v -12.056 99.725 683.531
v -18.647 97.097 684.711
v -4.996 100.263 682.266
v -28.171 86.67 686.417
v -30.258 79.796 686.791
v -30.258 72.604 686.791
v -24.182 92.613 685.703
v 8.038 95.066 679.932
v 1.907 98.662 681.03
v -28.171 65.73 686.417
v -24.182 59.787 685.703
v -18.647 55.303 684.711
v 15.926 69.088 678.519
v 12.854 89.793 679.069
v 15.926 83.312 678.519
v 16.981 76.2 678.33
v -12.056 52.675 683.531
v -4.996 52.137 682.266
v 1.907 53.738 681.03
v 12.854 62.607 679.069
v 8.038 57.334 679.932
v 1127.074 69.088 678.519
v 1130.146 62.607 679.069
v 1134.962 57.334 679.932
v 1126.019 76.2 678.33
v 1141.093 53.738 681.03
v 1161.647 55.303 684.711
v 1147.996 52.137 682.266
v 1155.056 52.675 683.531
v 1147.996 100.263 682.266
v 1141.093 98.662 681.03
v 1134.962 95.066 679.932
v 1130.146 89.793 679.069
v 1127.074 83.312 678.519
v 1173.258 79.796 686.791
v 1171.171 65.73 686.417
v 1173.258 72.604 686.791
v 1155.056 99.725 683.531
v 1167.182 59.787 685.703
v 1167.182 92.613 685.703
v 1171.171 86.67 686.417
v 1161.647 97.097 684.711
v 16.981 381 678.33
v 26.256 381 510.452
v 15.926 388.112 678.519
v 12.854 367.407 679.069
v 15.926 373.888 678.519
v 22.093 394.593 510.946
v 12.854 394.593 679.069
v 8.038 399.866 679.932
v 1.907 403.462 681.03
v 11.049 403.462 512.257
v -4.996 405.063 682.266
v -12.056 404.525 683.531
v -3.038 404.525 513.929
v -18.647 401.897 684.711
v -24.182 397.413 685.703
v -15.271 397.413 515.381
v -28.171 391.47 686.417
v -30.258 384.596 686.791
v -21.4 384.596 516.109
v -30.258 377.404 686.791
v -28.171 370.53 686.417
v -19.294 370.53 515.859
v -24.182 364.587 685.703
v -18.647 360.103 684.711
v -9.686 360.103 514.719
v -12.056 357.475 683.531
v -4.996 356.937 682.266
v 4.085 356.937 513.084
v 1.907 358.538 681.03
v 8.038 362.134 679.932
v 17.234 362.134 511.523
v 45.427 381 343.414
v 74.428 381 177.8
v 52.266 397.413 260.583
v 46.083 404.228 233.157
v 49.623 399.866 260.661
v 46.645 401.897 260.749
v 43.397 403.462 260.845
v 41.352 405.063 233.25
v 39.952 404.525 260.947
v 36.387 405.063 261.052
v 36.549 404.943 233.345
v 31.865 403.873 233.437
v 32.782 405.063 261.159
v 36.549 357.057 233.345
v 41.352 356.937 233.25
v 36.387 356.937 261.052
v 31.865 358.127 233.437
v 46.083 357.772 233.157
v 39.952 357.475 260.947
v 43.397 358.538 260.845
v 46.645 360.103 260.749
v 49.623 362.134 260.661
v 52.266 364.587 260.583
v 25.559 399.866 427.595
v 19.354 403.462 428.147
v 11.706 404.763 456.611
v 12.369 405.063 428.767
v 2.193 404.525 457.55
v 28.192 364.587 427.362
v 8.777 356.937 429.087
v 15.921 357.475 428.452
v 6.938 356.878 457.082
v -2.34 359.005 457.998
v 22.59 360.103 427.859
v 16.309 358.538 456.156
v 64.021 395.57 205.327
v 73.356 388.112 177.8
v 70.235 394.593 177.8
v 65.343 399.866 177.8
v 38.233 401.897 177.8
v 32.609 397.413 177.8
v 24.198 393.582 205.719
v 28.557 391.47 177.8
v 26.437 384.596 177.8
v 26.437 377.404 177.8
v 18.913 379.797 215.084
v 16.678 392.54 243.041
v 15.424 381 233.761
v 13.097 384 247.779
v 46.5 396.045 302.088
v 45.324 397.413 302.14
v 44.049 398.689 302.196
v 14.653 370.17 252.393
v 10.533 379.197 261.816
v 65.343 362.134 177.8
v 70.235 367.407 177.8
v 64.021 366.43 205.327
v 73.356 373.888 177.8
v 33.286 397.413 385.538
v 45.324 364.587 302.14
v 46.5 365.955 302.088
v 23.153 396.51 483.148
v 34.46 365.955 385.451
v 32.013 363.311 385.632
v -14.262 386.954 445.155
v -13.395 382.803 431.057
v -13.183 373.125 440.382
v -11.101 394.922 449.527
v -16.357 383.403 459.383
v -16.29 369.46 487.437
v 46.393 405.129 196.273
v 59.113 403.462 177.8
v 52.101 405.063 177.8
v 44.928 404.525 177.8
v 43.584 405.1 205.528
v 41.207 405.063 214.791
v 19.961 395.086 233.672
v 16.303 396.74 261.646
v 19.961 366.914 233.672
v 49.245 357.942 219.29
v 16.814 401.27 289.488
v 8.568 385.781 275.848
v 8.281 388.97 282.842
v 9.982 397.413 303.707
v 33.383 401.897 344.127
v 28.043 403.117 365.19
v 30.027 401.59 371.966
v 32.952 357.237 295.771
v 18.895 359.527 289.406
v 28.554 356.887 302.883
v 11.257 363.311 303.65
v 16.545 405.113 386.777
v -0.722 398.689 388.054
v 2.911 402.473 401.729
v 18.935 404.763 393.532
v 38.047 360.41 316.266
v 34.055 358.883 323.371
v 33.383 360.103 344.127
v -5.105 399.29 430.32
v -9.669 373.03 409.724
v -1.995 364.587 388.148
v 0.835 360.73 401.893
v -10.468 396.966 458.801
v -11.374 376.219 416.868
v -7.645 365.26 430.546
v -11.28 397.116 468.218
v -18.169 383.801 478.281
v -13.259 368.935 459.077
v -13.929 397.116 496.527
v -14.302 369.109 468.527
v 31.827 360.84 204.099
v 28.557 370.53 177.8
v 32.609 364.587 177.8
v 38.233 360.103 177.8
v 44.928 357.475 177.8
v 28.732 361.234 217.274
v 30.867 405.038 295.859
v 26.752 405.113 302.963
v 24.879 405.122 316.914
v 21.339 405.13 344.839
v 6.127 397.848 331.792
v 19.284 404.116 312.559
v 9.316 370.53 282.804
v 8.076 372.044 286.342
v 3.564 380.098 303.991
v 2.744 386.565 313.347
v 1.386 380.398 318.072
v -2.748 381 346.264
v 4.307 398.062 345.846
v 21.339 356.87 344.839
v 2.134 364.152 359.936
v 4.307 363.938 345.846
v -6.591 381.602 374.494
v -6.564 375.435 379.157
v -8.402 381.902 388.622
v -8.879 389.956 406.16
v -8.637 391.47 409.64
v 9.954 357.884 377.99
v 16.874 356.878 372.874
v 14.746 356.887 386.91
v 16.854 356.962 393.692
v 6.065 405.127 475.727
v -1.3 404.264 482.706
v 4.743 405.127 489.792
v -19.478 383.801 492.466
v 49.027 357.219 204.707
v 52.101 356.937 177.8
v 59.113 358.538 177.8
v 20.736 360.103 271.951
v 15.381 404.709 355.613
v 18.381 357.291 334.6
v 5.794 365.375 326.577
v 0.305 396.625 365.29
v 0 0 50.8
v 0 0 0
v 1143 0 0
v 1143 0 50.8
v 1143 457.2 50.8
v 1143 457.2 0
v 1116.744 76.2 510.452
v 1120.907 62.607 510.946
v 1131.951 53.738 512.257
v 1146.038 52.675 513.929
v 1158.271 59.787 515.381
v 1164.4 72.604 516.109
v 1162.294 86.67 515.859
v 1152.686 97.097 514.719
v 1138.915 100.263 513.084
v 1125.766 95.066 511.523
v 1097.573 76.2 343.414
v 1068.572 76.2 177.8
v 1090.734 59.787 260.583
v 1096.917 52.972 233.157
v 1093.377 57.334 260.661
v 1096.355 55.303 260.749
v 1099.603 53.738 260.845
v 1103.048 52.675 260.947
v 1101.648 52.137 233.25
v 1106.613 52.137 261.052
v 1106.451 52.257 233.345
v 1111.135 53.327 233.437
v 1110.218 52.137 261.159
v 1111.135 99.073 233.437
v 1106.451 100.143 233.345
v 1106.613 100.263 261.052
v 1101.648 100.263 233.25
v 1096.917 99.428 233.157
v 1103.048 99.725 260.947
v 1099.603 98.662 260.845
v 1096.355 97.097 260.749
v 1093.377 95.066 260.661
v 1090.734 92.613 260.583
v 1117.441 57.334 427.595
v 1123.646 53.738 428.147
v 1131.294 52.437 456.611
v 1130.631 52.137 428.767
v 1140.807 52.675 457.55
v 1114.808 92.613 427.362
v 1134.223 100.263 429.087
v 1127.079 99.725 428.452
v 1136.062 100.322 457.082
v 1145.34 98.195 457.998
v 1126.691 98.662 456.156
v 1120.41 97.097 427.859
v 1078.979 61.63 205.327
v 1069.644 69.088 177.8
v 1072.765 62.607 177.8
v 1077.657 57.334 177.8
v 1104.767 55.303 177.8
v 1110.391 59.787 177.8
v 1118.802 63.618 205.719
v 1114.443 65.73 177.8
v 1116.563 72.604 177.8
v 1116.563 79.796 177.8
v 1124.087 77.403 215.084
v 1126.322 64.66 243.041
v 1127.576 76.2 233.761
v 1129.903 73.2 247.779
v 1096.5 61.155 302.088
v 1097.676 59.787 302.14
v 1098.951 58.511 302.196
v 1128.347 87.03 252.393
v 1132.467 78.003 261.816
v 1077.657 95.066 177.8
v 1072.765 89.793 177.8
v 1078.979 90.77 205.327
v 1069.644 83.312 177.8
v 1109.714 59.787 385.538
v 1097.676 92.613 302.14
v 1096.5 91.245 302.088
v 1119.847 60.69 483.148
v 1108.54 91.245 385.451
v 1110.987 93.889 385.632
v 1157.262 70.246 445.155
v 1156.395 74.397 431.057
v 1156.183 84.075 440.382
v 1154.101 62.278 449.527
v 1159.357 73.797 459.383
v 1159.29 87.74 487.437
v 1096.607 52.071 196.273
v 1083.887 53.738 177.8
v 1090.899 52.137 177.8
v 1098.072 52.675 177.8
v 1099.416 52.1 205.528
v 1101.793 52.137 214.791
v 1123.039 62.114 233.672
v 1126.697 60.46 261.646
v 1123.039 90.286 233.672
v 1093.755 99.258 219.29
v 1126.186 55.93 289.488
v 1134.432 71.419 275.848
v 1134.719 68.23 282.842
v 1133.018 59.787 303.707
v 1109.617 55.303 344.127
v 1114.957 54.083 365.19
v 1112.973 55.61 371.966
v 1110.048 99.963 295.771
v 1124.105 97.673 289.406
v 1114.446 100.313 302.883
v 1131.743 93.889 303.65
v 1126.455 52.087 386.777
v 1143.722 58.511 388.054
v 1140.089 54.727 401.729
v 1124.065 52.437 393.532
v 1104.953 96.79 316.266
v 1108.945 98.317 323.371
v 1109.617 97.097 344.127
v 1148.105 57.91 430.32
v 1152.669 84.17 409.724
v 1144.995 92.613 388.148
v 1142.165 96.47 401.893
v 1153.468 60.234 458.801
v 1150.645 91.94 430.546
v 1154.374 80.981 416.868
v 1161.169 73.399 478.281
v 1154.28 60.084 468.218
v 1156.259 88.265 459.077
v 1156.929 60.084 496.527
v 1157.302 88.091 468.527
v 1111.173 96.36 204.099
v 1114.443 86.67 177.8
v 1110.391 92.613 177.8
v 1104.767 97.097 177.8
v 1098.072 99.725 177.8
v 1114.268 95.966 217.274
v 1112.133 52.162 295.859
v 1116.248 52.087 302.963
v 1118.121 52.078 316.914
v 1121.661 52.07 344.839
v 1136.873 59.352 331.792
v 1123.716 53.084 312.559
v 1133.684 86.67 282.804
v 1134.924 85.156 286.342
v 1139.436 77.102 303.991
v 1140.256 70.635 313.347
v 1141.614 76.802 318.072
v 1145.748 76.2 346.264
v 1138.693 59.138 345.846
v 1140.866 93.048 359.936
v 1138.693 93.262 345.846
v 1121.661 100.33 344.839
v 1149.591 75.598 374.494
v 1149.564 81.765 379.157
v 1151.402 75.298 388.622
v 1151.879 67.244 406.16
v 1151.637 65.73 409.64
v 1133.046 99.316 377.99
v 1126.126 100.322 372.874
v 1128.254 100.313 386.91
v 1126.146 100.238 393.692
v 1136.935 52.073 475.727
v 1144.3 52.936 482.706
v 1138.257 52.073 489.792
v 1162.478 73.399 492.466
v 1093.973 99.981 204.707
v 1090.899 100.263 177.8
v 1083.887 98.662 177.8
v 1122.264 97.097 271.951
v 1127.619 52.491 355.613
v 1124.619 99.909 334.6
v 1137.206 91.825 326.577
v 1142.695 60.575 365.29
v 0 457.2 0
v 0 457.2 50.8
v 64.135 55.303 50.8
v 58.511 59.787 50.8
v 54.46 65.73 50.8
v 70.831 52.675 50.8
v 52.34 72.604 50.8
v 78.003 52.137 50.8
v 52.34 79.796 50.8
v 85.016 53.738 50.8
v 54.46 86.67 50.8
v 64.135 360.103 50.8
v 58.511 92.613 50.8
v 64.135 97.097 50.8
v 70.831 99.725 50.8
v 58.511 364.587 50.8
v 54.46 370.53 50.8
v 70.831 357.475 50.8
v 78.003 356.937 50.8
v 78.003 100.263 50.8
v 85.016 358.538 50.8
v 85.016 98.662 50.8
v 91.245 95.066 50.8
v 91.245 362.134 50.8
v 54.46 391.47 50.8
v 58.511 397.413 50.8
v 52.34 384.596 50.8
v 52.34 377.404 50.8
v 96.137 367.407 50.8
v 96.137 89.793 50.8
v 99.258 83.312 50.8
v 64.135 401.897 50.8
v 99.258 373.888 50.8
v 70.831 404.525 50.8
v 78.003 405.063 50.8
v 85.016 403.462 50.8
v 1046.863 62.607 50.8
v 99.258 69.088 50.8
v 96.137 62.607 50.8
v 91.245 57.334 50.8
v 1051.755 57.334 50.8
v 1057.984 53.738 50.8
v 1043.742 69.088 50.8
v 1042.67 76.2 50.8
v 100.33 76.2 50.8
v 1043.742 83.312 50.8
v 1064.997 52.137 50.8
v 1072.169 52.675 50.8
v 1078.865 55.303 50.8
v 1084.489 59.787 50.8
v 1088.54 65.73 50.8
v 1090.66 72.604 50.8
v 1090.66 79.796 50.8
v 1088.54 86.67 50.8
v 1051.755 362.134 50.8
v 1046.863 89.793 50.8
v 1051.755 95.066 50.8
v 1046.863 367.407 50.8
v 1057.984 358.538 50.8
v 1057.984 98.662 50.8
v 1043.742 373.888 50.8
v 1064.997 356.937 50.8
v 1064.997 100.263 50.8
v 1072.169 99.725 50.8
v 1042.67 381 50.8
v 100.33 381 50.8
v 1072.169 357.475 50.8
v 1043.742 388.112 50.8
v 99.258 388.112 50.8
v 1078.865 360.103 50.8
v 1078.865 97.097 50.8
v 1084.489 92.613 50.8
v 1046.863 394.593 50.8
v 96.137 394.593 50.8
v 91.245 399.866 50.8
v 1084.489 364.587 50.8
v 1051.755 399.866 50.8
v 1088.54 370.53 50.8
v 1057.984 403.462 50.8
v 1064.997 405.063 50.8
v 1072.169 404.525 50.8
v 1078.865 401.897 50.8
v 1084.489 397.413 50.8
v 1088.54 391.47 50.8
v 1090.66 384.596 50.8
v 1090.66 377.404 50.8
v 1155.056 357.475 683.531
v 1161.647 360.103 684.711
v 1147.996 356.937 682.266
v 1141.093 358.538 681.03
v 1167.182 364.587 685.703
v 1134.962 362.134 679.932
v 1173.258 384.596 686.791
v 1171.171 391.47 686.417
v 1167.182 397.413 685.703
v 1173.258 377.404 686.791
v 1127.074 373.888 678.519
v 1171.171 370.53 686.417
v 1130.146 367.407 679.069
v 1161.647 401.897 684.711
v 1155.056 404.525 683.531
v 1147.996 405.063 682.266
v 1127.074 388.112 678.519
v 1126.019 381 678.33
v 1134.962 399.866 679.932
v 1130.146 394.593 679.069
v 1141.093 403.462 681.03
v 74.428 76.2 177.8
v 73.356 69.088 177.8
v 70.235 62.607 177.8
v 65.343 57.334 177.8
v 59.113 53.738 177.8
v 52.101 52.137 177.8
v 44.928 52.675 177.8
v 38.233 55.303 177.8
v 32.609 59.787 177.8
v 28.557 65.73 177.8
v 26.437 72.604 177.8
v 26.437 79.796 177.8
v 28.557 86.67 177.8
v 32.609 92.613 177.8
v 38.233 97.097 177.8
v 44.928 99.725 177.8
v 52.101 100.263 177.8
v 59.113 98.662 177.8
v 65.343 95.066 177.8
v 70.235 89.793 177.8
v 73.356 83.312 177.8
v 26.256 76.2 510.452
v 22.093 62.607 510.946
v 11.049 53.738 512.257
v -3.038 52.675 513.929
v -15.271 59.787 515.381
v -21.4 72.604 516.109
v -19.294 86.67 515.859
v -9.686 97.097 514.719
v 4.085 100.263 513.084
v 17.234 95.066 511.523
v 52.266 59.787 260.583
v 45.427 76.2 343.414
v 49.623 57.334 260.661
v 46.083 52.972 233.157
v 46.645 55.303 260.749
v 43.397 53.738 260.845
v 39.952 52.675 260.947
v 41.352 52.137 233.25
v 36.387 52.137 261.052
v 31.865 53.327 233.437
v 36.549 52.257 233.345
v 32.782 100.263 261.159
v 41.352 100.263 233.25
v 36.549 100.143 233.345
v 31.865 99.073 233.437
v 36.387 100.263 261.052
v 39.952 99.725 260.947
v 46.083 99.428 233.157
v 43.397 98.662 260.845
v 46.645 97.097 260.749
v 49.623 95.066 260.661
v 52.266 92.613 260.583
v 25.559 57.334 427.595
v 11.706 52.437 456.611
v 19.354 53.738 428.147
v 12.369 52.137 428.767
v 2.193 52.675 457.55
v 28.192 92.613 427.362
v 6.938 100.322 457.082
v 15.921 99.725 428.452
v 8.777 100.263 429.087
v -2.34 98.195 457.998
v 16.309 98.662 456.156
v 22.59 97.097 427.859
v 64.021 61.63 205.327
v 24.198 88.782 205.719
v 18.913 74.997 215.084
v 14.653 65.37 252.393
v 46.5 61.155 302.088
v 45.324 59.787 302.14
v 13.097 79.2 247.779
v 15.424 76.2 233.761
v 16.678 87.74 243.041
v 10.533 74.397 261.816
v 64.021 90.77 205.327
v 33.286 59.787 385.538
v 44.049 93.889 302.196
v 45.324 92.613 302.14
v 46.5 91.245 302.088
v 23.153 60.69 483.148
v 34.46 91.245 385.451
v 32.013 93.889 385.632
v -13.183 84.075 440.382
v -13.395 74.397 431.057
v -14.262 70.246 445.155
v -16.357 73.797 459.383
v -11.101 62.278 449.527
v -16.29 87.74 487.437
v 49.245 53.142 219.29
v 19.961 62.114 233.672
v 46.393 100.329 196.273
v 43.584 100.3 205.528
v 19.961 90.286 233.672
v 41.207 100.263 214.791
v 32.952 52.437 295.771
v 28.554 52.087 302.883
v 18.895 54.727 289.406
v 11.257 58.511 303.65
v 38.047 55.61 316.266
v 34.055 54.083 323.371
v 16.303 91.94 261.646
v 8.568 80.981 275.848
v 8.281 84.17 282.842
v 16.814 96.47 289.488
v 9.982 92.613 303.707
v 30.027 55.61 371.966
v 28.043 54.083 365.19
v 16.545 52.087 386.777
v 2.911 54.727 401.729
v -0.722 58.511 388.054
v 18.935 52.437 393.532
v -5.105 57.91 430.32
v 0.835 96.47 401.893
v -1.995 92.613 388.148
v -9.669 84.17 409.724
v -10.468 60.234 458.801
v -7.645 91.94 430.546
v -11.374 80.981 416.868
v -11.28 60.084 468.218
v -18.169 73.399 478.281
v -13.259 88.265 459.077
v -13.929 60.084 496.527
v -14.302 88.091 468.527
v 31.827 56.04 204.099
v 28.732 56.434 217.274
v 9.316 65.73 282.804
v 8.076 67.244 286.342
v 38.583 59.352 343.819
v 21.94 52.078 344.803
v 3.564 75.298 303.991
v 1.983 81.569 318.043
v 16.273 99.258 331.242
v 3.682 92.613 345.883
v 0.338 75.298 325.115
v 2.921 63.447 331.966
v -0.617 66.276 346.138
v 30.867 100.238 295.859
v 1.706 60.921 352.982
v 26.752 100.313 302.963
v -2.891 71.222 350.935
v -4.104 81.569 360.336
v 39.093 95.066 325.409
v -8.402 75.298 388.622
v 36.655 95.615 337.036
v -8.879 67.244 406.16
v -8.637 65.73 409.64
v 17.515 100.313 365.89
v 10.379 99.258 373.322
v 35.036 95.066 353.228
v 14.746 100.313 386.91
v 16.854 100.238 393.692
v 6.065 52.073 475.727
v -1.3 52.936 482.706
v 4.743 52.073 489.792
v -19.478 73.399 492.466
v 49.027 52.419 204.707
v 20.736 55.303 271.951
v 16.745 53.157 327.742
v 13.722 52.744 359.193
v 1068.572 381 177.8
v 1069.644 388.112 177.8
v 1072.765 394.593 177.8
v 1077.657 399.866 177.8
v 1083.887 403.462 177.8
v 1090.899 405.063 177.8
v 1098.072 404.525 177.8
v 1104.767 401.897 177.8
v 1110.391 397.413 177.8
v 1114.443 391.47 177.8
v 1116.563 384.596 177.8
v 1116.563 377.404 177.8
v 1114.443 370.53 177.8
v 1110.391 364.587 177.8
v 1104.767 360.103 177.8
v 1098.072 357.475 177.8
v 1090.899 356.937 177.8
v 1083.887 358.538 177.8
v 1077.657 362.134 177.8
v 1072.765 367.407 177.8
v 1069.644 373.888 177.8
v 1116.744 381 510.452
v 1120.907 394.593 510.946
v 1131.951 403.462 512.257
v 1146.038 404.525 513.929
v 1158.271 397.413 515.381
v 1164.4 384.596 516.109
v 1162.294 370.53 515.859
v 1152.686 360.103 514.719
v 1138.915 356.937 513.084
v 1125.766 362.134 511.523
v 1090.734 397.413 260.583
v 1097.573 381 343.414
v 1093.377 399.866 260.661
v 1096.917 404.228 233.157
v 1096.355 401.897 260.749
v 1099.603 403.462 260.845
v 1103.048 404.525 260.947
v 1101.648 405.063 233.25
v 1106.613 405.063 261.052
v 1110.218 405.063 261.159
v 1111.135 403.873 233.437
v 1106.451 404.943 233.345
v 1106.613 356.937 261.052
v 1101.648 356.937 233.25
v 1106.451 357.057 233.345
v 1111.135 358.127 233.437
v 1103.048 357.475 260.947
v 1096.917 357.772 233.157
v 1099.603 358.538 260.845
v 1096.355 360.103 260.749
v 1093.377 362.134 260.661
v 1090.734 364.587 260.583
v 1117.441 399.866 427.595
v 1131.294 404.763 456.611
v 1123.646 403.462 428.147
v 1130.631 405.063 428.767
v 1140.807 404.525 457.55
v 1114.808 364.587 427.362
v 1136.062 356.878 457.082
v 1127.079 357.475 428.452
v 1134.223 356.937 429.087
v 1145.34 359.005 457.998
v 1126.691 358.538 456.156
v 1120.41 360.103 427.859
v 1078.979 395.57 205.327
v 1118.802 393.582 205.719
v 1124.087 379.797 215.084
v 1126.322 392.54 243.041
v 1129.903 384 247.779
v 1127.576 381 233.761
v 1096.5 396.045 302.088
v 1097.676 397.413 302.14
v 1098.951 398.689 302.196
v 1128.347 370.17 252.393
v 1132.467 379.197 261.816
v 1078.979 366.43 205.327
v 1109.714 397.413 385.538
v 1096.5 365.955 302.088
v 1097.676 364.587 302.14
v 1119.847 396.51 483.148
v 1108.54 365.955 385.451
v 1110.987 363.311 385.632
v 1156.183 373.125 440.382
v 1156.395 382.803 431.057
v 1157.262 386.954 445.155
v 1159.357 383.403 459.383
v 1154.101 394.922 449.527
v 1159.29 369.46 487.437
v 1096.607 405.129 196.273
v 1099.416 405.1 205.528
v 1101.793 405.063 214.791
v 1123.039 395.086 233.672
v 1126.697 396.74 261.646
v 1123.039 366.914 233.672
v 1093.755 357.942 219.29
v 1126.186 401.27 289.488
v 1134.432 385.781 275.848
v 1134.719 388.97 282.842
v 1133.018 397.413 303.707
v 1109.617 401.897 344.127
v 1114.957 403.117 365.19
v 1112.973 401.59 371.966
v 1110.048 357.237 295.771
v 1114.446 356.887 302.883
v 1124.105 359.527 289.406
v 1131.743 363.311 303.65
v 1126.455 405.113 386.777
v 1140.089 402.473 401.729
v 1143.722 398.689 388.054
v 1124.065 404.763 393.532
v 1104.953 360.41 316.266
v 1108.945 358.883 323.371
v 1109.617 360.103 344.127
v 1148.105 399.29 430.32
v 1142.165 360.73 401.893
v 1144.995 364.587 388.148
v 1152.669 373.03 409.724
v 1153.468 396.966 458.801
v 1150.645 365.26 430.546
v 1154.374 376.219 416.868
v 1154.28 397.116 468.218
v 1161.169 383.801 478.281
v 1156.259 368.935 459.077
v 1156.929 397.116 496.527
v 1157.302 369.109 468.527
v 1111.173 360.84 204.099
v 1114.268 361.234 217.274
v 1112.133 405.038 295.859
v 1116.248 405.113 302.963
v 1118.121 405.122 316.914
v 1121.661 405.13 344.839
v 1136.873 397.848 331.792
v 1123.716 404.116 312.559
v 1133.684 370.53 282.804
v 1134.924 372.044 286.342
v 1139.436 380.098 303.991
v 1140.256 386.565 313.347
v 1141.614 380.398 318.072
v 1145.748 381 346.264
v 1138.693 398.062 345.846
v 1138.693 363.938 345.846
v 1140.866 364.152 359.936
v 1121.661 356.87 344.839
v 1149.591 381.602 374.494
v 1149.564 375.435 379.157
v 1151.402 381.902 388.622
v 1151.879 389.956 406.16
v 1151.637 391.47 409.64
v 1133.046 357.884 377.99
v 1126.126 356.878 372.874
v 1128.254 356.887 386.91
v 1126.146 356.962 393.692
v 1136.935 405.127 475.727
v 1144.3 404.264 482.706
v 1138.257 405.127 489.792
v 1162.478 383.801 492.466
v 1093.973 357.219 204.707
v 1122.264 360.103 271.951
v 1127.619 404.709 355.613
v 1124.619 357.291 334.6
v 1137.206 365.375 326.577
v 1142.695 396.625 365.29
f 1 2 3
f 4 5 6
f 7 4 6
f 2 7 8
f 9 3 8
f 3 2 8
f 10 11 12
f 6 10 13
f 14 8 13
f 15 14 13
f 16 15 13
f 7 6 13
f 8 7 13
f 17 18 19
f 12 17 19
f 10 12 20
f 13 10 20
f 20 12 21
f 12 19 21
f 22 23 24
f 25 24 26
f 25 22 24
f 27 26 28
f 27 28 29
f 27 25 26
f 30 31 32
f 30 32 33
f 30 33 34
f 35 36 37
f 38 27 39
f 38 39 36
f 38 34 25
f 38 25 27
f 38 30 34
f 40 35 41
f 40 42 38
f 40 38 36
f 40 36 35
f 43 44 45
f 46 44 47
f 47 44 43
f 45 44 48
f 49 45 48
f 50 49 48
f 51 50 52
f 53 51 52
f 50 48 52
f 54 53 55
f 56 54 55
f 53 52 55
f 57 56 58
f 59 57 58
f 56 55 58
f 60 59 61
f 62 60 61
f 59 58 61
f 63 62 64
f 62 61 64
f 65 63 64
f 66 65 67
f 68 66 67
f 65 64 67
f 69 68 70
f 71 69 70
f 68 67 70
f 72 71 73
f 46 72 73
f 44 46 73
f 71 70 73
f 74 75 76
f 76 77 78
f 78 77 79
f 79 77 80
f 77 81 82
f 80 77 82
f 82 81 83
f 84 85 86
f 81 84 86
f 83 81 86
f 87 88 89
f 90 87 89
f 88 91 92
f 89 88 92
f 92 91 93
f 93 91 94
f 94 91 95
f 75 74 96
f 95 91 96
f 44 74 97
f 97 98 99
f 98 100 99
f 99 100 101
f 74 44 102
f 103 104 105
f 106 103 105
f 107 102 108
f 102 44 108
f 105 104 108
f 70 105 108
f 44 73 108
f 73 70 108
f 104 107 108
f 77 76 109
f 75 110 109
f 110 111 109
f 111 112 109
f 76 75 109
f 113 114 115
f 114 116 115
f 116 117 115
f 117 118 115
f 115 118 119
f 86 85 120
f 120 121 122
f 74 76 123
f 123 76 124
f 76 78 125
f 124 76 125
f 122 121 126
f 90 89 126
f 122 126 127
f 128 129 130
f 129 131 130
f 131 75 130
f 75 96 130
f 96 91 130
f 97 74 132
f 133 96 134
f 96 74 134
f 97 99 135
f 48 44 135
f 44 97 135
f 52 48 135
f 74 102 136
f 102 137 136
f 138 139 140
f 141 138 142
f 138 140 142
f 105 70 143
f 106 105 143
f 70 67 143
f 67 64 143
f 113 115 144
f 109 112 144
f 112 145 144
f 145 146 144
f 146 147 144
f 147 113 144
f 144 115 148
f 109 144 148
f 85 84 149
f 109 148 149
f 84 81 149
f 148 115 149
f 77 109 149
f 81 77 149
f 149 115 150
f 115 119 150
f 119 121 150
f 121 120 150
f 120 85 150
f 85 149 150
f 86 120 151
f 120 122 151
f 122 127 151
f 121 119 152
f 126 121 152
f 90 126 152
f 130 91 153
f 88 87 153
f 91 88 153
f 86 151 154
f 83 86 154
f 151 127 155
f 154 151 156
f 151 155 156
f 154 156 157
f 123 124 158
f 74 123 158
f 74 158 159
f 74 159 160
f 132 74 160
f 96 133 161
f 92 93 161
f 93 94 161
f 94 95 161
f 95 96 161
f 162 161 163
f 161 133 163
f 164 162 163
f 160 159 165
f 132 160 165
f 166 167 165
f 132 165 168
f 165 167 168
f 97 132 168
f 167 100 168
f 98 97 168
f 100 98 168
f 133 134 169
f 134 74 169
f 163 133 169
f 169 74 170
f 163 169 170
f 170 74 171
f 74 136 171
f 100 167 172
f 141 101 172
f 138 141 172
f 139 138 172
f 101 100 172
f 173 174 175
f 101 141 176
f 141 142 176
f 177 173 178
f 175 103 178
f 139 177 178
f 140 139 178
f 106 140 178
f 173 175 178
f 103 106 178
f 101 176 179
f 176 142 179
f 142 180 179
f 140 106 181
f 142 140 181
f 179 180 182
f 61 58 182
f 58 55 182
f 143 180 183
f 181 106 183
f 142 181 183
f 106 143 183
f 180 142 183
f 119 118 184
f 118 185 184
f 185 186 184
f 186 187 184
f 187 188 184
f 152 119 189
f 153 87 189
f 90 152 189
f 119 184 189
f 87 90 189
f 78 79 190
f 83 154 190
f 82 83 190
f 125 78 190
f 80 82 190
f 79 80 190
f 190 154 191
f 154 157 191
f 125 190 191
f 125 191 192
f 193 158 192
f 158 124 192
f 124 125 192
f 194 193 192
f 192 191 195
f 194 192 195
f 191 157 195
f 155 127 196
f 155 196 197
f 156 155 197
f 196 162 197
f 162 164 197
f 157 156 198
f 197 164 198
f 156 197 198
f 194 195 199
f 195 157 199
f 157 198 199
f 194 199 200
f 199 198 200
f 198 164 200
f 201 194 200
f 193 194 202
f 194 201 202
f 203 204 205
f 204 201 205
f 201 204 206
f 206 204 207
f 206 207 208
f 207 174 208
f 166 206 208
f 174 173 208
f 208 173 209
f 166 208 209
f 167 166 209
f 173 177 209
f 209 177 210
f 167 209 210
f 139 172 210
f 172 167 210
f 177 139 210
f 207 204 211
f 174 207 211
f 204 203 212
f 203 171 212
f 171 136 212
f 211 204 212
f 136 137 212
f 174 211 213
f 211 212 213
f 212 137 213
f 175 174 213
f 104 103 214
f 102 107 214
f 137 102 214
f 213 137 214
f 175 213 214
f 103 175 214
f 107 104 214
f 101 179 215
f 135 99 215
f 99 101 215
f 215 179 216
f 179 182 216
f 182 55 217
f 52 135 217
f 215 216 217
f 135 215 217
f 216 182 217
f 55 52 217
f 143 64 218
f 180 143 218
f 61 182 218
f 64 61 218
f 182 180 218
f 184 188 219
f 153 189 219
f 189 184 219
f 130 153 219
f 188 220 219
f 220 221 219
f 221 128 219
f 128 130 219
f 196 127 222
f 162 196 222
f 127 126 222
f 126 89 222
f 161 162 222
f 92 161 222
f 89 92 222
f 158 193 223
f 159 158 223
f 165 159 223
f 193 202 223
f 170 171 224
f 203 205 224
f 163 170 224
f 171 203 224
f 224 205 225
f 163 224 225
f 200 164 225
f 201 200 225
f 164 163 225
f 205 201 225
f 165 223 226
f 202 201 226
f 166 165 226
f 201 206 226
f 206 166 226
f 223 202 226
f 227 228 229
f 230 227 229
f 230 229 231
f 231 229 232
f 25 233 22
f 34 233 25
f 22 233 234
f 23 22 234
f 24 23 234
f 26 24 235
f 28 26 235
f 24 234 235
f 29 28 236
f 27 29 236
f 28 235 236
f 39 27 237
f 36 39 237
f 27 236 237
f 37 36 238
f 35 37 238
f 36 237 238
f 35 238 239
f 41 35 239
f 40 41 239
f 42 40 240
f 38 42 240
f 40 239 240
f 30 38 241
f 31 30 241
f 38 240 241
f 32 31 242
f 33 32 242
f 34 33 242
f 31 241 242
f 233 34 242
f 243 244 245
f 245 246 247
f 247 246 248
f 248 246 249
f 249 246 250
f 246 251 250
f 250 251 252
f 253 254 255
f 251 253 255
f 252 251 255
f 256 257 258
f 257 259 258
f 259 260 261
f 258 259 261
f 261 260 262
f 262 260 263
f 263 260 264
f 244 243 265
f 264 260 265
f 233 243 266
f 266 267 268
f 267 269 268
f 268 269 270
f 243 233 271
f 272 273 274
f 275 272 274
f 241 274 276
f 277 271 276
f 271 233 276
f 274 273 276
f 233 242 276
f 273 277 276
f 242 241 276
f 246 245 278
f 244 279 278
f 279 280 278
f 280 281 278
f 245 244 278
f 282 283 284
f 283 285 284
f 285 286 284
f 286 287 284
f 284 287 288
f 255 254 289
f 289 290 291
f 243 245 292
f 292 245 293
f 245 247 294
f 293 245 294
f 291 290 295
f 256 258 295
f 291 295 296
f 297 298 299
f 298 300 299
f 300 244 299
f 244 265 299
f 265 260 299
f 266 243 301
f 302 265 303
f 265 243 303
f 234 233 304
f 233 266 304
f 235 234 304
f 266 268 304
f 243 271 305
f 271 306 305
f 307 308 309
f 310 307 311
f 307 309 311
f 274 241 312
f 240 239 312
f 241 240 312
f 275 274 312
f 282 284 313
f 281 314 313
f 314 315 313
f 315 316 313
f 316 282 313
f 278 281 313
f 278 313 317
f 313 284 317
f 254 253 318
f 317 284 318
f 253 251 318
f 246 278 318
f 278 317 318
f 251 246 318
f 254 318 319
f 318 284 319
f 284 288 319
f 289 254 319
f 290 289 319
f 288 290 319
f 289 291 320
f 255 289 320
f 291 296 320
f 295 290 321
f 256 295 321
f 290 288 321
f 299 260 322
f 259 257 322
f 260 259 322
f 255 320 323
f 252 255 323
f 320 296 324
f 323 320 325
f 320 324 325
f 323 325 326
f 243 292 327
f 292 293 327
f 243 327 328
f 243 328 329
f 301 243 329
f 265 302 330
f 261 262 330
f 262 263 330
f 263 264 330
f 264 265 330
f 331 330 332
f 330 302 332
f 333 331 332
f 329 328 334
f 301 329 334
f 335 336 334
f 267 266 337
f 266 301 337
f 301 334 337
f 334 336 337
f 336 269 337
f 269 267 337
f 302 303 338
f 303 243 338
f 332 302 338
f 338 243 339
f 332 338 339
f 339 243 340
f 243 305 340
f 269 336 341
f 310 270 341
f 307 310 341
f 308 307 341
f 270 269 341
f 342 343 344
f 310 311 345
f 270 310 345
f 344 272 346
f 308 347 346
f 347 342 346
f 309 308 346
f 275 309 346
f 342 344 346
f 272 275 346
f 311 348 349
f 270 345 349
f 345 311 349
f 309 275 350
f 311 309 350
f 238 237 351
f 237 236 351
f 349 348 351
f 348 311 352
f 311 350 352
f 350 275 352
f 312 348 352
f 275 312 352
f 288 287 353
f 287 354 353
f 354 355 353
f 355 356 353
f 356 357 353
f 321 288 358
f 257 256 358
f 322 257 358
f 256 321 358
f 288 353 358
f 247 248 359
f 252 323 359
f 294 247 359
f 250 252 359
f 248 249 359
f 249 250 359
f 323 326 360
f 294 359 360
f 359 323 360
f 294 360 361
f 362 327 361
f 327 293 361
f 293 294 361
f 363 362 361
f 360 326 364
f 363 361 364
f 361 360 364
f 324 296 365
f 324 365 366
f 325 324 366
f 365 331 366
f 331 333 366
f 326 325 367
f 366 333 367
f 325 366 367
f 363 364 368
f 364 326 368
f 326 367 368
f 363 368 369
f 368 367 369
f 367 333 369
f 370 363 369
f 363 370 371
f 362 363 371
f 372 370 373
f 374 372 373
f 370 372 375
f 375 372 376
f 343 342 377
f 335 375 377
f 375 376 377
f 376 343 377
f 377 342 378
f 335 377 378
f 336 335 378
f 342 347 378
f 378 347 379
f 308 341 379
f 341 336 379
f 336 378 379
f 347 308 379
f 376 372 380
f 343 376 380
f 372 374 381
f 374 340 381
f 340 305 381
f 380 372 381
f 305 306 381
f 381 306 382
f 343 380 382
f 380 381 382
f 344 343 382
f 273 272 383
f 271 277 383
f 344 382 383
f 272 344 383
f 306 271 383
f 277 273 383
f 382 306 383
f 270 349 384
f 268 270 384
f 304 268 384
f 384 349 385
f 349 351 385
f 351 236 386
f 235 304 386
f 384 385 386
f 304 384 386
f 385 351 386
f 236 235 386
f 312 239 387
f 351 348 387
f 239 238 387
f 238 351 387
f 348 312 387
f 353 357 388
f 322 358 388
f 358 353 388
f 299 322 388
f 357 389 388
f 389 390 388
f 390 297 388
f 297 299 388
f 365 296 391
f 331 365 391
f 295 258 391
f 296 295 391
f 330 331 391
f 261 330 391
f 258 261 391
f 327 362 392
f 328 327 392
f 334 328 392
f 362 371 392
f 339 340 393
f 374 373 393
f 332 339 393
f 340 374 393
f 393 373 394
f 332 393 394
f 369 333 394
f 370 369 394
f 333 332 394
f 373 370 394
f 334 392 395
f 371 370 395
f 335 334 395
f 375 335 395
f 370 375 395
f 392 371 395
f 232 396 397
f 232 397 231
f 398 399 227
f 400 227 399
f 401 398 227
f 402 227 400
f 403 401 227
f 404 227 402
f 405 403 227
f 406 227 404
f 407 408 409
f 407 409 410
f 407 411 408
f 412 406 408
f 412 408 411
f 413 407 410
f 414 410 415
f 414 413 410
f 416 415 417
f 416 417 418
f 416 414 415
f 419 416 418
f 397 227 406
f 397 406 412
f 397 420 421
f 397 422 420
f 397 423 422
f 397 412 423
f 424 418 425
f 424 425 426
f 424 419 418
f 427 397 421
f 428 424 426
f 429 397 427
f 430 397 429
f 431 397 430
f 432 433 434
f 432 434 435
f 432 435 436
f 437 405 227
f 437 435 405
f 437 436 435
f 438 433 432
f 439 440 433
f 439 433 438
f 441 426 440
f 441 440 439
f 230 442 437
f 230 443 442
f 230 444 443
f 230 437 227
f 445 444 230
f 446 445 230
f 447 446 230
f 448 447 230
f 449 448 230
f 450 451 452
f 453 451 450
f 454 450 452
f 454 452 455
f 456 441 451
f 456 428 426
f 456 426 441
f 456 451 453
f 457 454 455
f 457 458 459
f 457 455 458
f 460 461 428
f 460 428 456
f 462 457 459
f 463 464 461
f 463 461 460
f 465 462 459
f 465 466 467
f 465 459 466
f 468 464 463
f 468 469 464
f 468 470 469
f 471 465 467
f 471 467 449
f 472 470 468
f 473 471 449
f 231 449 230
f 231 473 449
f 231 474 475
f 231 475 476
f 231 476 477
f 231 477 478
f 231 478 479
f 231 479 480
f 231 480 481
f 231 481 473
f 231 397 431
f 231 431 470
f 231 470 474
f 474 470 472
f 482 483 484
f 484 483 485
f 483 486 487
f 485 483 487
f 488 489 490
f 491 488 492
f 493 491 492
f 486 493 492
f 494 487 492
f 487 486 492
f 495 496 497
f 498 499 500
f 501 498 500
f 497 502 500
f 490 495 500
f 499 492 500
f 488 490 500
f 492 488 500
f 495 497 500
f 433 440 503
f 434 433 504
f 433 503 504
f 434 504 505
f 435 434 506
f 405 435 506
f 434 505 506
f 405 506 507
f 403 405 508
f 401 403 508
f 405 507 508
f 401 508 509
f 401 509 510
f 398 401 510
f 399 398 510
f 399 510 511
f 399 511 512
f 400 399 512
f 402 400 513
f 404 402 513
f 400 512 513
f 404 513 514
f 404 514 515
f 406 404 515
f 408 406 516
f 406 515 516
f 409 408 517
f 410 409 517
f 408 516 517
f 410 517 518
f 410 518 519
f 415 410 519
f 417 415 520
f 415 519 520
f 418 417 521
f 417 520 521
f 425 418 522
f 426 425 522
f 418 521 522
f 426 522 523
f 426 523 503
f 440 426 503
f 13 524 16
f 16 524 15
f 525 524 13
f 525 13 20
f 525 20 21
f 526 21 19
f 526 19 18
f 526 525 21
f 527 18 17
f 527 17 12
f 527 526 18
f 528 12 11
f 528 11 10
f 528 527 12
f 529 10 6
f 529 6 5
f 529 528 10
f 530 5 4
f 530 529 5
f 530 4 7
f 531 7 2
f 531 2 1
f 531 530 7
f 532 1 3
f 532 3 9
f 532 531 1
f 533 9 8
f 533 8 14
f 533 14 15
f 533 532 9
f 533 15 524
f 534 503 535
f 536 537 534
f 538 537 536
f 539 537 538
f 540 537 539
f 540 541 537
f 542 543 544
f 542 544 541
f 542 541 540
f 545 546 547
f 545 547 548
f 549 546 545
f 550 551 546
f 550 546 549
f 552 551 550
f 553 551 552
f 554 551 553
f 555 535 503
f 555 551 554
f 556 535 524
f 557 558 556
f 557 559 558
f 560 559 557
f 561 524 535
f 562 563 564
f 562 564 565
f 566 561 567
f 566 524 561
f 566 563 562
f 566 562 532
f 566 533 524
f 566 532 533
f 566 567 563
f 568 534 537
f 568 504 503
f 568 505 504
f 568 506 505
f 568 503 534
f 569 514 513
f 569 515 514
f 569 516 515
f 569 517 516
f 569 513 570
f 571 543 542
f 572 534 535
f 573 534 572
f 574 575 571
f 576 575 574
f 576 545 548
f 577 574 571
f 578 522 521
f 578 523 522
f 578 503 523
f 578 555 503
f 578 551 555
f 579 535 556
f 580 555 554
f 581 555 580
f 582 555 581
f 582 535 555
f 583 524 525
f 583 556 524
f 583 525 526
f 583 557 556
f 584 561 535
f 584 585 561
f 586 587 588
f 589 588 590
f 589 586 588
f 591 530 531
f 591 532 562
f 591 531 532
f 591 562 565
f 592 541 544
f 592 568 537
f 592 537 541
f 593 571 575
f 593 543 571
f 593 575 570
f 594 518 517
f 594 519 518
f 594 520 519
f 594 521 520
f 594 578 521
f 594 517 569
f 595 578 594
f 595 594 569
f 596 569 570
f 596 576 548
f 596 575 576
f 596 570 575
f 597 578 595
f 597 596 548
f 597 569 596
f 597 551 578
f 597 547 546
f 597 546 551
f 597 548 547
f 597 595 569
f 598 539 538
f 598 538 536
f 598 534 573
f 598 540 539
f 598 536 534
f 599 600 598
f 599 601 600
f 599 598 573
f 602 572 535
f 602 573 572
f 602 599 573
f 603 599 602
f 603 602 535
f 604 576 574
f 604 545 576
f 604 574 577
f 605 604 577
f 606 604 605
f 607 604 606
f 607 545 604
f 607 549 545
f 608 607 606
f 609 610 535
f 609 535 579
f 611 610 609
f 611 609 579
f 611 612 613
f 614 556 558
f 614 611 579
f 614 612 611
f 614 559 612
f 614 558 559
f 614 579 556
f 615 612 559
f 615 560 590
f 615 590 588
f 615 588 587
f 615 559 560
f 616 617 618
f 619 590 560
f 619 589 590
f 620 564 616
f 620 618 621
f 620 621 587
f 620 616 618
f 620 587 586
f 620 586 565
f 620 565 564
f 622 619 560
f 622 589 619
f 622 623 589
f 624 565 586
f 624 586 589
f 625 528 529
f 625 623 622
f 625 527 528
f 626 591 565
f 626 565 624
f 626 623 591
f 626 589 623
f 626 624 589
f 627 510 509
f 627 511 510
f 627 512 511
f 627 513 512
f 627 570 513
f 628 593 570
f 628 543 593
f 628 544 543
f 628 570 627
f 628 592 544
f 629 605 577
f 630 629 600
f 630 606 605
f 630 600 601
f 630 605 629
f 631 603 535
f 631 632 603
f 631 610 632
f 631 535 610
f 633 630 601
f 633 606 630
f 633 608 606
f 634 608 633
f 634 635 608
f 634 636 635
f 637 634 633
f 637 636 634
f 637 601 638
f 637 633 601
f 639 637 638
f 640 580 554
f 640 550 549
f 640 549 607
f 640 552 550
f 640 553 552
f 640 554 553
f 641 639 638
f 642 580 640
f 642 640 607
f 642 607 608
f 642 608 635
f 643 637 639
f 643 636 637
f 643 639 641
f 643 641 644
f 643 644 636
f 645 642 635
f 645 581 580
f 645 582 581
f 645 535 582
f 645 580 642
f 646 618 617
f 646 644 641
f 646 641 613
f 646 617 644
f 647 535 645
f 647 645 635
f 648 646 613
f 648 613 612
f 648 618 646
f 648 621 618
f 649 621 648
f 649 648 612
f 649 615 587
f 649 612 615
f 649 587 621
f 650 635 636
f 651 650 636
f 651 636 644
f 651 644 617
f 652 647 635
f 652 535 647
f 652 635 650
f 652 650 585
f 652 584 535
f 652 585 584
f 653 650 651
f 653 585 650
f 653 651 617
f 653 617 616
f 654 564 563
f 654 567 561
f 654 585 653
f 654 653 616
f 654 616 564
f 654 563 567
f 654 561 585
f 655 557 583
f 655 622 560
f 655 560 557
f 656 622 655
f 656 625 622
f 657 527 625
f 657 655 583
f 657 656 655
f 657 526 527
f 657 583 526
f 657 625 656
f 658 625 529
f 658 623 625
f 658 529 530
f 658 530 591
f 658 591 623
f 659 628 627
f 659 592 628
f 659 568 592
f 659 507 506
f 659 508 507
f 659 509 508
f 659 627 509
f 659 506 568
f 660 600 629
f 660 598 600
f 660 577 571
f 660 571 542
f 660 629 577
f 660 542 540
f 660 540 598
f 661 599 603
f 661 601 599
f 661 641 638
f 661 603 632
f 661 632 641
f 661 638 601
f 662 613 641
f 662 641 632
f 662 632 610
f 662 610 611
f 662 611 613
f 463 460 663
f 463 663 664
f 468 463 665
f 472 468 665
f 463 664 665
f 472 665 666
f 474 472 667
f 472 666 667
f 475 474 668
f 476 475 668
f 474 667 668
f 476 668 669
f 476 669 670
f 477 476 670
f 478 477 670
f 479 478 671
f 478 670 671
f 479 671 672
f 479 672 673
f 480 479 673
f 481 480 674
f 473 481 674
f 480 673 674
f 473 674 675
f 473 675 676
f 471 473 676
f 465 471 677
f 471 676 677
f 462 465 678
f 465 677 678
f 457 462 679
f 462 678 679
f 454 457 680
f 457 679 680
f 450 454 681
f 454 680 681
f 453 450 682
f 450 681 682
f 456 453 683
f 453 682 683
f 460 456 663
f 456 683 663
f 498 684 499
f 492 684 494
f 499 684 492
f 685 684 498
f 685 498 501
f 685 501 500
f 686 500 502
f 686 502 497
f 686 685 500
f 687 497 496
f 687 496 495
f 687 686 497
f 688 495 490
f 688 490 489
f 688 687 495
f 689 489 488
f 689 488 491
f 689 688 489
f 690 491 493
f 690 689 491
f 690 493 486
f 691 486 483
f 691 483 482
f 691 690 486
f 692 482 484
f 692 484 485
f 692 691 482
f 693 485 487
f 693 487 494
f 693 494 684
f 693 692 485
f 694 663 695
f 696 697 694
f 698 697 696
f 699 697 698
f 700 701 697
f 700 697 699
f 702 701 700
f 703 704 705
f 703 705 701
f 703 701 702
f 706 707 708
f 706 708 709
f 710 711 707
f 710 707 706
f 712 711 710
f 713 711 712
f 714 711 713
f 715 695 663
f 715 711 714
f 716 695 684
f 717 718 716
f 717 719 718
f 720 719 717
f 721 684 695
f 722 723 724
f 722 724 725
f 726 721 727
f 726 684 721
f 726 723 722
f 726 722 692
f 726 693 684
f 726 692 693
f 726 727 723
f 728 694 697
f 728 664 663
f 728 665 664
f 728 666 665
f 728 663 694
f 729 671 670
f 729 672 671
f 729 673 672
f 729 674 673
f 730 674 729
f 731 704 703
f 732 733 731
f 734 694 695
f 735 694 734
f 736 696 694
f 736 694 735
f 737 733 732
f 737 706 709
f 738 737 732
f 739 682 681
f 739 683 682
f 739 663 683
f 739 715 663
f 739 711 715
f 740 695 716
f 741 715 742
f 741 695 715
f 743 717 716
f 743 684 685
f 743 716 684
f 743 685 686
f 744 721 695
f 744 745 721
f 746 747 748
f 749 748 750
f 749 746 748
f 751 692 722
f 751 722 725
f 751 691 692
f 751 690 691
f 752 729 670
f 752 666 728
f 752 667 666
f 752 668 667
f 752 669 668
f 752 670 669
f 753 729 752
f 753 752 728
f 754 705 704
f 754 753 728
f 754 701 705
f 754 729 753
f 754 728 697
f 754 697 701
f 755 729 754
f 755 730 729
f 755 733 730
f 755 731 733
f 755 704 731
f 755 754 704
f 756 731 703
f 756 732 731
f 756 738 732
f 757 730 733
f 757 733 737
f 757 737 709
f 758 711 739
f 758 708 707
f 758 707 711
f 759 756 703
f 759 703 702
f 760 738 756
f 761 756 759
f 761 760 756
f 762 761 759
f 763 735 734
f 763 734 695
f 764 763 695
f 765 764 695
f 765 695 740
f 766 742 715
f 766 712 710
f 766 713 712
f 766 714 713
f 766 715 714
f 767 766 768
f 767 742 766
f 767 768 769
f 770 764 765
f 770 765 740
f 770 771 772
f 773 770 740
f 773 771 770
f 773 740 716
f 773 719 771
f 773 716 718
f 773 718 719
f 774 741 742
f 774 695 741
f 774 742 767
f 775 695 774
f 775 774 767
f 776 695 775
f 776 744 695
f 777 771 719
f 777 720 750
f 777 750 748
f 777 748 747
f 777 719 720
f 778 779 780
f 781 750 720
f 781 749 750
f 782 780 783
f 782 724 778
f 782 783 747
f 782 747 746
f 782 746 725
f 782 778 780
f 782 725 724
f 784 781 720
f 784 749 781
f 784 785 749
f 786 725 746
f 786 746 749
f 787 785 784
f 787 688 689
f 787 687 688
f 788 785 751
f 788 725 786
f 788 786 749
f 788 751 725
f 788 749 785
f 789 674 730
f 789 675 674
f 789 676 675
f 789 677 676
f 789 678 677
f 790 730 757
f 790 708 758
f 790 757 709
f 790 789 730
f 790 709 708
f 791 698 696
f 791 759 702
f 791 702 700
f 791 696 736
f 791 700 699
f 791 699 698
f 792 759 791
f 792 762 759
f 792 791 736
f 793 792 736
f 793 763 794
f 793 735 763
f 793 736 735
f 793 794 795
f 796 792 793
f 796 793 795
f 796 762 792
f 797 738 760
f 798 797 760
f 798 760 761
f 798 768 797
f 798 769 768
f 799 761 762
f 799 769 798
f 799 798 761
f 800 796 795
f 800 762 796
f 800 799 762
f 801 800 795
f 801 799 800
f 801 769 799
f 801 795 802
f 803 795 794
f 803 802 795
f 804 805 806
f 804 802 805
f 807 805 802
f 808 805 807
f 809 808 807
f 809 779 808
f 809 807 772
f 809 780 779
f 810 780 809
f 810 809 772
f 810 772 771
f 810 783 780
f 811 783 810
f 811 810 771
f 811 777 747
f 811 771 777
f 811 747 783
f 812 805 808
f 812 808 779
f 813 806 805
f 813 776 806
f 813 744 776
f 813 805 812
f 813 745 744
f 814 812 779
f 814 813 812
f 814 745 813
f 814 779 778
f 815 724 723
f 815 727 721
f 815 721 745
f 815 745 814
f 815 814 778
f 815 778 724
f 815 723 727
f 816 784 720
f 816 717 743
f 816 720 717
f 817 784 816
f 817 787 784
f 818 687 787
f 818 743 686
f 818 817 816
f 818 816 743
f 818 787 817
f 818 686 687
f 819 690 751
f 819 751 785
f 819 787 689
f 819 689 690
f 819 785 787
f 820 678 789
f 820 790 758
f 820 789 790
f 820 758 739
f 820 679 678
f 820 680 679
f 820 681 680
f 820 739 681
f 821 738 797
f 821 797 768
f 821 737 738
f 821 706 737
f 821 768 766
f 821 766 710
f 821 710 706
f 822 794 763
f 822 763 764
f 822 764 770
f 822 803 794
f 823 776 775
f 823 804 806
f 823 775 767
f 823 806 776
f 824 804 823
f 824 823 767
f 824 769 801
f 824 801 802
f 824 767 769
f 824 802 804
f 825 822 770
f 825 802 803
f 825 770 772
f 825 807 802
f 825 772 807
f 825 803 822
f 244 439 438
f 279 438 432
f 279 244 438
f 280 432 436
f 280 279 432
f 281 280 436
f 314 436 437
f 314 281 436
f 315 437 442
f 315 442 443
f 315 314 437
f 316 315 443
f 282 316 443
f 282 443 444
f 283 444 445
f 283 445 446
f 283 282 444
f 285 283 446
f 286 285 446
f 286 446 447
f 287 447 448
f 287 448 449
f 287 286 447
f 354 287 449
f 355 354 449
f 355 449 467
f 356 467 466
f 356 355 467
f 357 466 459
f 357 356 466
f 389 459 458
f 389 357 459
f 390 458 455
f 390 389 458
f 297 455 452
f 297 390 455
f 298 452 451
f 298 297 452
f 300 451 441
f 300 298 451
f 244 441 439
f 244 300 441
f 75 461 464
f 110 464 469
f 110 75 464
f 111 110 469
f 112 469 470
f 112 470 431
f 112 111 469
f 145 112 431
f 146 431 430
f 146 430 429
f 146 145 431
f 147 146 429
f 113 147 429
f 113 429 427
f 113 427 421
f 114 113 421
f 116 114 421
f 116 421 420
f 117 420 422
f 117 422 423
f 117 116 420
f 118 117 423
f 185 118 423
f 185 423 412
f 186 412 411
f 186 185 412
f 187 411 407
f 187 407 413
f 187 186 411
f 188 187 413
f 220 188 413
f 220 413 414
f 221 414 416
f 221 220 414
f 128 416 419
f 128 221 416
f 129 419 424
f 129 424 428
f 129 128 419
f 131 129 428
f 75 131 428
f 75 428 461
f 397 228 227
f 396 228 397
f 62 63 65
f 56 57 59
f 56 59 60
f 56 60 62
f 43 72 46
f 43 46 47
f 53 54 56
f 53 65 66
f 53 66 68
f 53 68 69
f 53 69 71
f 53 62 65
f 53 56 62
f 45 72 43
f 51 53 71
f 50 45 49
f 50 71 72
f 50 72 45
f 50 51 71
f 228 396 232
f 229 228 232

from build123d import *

# Parameters (mm, degrees)
SKETCH1_W               = 1143
SKETCH1_H               = 457.2
TABLETOP_DEPTH          = 50.8
PROFILE_R               = 24.13
MIRROR2_COPY_1_SKETCH_R = 24.13


with BuildPart() as part:
    # Sketch1 → TableTop (new body)
    with BuildSketch(Plane.XY):
        with Locations((571.5, 228.6)):
            Rectangle(SKETCH1_W, SKETCH1_H)
    extrude(amount=TABLETOP_DEPTH)

    # Sweep1: sweep along a path in Sketch11
    with BuildLine(Plane(origin=(0, 381, 0), x_dir=(1, 0, 0), z_dir=(0, 1, 0))) as sweep1_path:
        Line((76.2, -50.8), (50.297706266, -177.8))
        ThreePointArc((50.297706266, -177.8), (10.572817848, -428.926986426), (-6.770877712, -682.584287318))
    # Profile → Sweep1 (sweep)
    with BuildSketch(Plane.XY.offset(50.8)):
        with Locations((76.2, 381)):
            Circle(PROFILE_R)
    sweep1 = sweep(path=sweep1_path.line)

    # Mirror1: Sweep1 across plane
    add(sweep1.mirror(Plane(origin=(571.5, 0, 0), x_dir=(0, 0, 1), z_dir=(1, 0, 0))))

    # Mirror2: Sweep1 across plane
    add(sweep1.mirror(Plane.ZX.offset(228.6)))

    # Mirror2 copy 1: sweep along a path in Mirror2 copy 1 path
    with BuildLine(Plane(origin=(1143, 76.2, 0), x_dir=(-1, 0, 0), z_dir=(0, -1, 0))) as mirror2_copy_1_path:
        Line((76.2, -50.8), (50.297706266, -177.8))
        ThreePointArc((50.297706266, -177.8), (10.572817848, -428.926986426), (-6.770877712, -682.584287318))
    # Mirror2 copy 1 sketch → Mirror2 copy 1 (sweep)
    with BuildSketch(Plane(origin=(1143, 457.2, 50.8), x_dir=(-1, 0, 0), z_dir=(0, 0, 1))):
        with Locations((76.2, 381)):
            Circle(MIRROR2_COPY_1_SKETCH_R)
    sweep(path=mirror2_copy_1_path.line)


solid = part.part
